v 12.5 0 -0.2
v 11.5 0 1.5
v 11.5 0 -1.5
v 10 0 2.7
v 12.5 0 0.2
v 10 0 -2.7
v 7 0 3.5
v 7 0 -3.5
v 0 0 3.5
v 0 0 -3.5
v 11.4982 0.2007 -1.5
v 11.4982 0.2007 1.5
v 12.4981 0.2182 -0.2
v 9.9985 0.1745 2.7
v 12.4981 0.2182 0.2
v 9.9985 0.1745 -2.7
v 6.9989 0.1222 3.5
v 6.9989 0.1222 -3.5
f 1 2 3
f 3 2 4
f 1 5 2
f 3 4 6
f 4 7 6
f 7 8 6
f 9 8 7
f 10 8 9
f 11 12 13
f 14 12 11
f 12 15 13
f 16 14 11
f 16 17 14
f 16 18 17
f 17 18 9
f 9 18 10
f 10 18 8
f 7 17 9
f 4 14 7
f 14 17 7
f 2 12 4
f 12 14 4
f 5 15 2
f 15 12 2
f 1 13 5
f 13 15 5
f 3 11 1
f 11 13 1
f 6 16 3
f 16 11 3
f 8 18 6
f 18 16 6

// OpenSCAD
$fa = 1;
$fs = 1;

cutoff = 9.5;

module cross_section() {
	polygon([
		[0.0,  3.5],
		[7.0,  3.5],
		[10.0,  2.7],
		[11.5, 1.5],
		[12.5, 0.2],
		[12.5, 0],
		[0, 0],
	]);
}


// translate([0,0, 10])
rotate_extrude(angle=1) {
	difference() {
		hull() {
			cross_section();
			mirror([0,1,0])
			cross_section();
		}
		translate([-100, -50])
			square(100);
		translate([0, cutoff, 0])
			square([80, 10], center=true);
		translate([0, cutoff * -1, 0])
			square([80, 10], center=true);
	}
}
